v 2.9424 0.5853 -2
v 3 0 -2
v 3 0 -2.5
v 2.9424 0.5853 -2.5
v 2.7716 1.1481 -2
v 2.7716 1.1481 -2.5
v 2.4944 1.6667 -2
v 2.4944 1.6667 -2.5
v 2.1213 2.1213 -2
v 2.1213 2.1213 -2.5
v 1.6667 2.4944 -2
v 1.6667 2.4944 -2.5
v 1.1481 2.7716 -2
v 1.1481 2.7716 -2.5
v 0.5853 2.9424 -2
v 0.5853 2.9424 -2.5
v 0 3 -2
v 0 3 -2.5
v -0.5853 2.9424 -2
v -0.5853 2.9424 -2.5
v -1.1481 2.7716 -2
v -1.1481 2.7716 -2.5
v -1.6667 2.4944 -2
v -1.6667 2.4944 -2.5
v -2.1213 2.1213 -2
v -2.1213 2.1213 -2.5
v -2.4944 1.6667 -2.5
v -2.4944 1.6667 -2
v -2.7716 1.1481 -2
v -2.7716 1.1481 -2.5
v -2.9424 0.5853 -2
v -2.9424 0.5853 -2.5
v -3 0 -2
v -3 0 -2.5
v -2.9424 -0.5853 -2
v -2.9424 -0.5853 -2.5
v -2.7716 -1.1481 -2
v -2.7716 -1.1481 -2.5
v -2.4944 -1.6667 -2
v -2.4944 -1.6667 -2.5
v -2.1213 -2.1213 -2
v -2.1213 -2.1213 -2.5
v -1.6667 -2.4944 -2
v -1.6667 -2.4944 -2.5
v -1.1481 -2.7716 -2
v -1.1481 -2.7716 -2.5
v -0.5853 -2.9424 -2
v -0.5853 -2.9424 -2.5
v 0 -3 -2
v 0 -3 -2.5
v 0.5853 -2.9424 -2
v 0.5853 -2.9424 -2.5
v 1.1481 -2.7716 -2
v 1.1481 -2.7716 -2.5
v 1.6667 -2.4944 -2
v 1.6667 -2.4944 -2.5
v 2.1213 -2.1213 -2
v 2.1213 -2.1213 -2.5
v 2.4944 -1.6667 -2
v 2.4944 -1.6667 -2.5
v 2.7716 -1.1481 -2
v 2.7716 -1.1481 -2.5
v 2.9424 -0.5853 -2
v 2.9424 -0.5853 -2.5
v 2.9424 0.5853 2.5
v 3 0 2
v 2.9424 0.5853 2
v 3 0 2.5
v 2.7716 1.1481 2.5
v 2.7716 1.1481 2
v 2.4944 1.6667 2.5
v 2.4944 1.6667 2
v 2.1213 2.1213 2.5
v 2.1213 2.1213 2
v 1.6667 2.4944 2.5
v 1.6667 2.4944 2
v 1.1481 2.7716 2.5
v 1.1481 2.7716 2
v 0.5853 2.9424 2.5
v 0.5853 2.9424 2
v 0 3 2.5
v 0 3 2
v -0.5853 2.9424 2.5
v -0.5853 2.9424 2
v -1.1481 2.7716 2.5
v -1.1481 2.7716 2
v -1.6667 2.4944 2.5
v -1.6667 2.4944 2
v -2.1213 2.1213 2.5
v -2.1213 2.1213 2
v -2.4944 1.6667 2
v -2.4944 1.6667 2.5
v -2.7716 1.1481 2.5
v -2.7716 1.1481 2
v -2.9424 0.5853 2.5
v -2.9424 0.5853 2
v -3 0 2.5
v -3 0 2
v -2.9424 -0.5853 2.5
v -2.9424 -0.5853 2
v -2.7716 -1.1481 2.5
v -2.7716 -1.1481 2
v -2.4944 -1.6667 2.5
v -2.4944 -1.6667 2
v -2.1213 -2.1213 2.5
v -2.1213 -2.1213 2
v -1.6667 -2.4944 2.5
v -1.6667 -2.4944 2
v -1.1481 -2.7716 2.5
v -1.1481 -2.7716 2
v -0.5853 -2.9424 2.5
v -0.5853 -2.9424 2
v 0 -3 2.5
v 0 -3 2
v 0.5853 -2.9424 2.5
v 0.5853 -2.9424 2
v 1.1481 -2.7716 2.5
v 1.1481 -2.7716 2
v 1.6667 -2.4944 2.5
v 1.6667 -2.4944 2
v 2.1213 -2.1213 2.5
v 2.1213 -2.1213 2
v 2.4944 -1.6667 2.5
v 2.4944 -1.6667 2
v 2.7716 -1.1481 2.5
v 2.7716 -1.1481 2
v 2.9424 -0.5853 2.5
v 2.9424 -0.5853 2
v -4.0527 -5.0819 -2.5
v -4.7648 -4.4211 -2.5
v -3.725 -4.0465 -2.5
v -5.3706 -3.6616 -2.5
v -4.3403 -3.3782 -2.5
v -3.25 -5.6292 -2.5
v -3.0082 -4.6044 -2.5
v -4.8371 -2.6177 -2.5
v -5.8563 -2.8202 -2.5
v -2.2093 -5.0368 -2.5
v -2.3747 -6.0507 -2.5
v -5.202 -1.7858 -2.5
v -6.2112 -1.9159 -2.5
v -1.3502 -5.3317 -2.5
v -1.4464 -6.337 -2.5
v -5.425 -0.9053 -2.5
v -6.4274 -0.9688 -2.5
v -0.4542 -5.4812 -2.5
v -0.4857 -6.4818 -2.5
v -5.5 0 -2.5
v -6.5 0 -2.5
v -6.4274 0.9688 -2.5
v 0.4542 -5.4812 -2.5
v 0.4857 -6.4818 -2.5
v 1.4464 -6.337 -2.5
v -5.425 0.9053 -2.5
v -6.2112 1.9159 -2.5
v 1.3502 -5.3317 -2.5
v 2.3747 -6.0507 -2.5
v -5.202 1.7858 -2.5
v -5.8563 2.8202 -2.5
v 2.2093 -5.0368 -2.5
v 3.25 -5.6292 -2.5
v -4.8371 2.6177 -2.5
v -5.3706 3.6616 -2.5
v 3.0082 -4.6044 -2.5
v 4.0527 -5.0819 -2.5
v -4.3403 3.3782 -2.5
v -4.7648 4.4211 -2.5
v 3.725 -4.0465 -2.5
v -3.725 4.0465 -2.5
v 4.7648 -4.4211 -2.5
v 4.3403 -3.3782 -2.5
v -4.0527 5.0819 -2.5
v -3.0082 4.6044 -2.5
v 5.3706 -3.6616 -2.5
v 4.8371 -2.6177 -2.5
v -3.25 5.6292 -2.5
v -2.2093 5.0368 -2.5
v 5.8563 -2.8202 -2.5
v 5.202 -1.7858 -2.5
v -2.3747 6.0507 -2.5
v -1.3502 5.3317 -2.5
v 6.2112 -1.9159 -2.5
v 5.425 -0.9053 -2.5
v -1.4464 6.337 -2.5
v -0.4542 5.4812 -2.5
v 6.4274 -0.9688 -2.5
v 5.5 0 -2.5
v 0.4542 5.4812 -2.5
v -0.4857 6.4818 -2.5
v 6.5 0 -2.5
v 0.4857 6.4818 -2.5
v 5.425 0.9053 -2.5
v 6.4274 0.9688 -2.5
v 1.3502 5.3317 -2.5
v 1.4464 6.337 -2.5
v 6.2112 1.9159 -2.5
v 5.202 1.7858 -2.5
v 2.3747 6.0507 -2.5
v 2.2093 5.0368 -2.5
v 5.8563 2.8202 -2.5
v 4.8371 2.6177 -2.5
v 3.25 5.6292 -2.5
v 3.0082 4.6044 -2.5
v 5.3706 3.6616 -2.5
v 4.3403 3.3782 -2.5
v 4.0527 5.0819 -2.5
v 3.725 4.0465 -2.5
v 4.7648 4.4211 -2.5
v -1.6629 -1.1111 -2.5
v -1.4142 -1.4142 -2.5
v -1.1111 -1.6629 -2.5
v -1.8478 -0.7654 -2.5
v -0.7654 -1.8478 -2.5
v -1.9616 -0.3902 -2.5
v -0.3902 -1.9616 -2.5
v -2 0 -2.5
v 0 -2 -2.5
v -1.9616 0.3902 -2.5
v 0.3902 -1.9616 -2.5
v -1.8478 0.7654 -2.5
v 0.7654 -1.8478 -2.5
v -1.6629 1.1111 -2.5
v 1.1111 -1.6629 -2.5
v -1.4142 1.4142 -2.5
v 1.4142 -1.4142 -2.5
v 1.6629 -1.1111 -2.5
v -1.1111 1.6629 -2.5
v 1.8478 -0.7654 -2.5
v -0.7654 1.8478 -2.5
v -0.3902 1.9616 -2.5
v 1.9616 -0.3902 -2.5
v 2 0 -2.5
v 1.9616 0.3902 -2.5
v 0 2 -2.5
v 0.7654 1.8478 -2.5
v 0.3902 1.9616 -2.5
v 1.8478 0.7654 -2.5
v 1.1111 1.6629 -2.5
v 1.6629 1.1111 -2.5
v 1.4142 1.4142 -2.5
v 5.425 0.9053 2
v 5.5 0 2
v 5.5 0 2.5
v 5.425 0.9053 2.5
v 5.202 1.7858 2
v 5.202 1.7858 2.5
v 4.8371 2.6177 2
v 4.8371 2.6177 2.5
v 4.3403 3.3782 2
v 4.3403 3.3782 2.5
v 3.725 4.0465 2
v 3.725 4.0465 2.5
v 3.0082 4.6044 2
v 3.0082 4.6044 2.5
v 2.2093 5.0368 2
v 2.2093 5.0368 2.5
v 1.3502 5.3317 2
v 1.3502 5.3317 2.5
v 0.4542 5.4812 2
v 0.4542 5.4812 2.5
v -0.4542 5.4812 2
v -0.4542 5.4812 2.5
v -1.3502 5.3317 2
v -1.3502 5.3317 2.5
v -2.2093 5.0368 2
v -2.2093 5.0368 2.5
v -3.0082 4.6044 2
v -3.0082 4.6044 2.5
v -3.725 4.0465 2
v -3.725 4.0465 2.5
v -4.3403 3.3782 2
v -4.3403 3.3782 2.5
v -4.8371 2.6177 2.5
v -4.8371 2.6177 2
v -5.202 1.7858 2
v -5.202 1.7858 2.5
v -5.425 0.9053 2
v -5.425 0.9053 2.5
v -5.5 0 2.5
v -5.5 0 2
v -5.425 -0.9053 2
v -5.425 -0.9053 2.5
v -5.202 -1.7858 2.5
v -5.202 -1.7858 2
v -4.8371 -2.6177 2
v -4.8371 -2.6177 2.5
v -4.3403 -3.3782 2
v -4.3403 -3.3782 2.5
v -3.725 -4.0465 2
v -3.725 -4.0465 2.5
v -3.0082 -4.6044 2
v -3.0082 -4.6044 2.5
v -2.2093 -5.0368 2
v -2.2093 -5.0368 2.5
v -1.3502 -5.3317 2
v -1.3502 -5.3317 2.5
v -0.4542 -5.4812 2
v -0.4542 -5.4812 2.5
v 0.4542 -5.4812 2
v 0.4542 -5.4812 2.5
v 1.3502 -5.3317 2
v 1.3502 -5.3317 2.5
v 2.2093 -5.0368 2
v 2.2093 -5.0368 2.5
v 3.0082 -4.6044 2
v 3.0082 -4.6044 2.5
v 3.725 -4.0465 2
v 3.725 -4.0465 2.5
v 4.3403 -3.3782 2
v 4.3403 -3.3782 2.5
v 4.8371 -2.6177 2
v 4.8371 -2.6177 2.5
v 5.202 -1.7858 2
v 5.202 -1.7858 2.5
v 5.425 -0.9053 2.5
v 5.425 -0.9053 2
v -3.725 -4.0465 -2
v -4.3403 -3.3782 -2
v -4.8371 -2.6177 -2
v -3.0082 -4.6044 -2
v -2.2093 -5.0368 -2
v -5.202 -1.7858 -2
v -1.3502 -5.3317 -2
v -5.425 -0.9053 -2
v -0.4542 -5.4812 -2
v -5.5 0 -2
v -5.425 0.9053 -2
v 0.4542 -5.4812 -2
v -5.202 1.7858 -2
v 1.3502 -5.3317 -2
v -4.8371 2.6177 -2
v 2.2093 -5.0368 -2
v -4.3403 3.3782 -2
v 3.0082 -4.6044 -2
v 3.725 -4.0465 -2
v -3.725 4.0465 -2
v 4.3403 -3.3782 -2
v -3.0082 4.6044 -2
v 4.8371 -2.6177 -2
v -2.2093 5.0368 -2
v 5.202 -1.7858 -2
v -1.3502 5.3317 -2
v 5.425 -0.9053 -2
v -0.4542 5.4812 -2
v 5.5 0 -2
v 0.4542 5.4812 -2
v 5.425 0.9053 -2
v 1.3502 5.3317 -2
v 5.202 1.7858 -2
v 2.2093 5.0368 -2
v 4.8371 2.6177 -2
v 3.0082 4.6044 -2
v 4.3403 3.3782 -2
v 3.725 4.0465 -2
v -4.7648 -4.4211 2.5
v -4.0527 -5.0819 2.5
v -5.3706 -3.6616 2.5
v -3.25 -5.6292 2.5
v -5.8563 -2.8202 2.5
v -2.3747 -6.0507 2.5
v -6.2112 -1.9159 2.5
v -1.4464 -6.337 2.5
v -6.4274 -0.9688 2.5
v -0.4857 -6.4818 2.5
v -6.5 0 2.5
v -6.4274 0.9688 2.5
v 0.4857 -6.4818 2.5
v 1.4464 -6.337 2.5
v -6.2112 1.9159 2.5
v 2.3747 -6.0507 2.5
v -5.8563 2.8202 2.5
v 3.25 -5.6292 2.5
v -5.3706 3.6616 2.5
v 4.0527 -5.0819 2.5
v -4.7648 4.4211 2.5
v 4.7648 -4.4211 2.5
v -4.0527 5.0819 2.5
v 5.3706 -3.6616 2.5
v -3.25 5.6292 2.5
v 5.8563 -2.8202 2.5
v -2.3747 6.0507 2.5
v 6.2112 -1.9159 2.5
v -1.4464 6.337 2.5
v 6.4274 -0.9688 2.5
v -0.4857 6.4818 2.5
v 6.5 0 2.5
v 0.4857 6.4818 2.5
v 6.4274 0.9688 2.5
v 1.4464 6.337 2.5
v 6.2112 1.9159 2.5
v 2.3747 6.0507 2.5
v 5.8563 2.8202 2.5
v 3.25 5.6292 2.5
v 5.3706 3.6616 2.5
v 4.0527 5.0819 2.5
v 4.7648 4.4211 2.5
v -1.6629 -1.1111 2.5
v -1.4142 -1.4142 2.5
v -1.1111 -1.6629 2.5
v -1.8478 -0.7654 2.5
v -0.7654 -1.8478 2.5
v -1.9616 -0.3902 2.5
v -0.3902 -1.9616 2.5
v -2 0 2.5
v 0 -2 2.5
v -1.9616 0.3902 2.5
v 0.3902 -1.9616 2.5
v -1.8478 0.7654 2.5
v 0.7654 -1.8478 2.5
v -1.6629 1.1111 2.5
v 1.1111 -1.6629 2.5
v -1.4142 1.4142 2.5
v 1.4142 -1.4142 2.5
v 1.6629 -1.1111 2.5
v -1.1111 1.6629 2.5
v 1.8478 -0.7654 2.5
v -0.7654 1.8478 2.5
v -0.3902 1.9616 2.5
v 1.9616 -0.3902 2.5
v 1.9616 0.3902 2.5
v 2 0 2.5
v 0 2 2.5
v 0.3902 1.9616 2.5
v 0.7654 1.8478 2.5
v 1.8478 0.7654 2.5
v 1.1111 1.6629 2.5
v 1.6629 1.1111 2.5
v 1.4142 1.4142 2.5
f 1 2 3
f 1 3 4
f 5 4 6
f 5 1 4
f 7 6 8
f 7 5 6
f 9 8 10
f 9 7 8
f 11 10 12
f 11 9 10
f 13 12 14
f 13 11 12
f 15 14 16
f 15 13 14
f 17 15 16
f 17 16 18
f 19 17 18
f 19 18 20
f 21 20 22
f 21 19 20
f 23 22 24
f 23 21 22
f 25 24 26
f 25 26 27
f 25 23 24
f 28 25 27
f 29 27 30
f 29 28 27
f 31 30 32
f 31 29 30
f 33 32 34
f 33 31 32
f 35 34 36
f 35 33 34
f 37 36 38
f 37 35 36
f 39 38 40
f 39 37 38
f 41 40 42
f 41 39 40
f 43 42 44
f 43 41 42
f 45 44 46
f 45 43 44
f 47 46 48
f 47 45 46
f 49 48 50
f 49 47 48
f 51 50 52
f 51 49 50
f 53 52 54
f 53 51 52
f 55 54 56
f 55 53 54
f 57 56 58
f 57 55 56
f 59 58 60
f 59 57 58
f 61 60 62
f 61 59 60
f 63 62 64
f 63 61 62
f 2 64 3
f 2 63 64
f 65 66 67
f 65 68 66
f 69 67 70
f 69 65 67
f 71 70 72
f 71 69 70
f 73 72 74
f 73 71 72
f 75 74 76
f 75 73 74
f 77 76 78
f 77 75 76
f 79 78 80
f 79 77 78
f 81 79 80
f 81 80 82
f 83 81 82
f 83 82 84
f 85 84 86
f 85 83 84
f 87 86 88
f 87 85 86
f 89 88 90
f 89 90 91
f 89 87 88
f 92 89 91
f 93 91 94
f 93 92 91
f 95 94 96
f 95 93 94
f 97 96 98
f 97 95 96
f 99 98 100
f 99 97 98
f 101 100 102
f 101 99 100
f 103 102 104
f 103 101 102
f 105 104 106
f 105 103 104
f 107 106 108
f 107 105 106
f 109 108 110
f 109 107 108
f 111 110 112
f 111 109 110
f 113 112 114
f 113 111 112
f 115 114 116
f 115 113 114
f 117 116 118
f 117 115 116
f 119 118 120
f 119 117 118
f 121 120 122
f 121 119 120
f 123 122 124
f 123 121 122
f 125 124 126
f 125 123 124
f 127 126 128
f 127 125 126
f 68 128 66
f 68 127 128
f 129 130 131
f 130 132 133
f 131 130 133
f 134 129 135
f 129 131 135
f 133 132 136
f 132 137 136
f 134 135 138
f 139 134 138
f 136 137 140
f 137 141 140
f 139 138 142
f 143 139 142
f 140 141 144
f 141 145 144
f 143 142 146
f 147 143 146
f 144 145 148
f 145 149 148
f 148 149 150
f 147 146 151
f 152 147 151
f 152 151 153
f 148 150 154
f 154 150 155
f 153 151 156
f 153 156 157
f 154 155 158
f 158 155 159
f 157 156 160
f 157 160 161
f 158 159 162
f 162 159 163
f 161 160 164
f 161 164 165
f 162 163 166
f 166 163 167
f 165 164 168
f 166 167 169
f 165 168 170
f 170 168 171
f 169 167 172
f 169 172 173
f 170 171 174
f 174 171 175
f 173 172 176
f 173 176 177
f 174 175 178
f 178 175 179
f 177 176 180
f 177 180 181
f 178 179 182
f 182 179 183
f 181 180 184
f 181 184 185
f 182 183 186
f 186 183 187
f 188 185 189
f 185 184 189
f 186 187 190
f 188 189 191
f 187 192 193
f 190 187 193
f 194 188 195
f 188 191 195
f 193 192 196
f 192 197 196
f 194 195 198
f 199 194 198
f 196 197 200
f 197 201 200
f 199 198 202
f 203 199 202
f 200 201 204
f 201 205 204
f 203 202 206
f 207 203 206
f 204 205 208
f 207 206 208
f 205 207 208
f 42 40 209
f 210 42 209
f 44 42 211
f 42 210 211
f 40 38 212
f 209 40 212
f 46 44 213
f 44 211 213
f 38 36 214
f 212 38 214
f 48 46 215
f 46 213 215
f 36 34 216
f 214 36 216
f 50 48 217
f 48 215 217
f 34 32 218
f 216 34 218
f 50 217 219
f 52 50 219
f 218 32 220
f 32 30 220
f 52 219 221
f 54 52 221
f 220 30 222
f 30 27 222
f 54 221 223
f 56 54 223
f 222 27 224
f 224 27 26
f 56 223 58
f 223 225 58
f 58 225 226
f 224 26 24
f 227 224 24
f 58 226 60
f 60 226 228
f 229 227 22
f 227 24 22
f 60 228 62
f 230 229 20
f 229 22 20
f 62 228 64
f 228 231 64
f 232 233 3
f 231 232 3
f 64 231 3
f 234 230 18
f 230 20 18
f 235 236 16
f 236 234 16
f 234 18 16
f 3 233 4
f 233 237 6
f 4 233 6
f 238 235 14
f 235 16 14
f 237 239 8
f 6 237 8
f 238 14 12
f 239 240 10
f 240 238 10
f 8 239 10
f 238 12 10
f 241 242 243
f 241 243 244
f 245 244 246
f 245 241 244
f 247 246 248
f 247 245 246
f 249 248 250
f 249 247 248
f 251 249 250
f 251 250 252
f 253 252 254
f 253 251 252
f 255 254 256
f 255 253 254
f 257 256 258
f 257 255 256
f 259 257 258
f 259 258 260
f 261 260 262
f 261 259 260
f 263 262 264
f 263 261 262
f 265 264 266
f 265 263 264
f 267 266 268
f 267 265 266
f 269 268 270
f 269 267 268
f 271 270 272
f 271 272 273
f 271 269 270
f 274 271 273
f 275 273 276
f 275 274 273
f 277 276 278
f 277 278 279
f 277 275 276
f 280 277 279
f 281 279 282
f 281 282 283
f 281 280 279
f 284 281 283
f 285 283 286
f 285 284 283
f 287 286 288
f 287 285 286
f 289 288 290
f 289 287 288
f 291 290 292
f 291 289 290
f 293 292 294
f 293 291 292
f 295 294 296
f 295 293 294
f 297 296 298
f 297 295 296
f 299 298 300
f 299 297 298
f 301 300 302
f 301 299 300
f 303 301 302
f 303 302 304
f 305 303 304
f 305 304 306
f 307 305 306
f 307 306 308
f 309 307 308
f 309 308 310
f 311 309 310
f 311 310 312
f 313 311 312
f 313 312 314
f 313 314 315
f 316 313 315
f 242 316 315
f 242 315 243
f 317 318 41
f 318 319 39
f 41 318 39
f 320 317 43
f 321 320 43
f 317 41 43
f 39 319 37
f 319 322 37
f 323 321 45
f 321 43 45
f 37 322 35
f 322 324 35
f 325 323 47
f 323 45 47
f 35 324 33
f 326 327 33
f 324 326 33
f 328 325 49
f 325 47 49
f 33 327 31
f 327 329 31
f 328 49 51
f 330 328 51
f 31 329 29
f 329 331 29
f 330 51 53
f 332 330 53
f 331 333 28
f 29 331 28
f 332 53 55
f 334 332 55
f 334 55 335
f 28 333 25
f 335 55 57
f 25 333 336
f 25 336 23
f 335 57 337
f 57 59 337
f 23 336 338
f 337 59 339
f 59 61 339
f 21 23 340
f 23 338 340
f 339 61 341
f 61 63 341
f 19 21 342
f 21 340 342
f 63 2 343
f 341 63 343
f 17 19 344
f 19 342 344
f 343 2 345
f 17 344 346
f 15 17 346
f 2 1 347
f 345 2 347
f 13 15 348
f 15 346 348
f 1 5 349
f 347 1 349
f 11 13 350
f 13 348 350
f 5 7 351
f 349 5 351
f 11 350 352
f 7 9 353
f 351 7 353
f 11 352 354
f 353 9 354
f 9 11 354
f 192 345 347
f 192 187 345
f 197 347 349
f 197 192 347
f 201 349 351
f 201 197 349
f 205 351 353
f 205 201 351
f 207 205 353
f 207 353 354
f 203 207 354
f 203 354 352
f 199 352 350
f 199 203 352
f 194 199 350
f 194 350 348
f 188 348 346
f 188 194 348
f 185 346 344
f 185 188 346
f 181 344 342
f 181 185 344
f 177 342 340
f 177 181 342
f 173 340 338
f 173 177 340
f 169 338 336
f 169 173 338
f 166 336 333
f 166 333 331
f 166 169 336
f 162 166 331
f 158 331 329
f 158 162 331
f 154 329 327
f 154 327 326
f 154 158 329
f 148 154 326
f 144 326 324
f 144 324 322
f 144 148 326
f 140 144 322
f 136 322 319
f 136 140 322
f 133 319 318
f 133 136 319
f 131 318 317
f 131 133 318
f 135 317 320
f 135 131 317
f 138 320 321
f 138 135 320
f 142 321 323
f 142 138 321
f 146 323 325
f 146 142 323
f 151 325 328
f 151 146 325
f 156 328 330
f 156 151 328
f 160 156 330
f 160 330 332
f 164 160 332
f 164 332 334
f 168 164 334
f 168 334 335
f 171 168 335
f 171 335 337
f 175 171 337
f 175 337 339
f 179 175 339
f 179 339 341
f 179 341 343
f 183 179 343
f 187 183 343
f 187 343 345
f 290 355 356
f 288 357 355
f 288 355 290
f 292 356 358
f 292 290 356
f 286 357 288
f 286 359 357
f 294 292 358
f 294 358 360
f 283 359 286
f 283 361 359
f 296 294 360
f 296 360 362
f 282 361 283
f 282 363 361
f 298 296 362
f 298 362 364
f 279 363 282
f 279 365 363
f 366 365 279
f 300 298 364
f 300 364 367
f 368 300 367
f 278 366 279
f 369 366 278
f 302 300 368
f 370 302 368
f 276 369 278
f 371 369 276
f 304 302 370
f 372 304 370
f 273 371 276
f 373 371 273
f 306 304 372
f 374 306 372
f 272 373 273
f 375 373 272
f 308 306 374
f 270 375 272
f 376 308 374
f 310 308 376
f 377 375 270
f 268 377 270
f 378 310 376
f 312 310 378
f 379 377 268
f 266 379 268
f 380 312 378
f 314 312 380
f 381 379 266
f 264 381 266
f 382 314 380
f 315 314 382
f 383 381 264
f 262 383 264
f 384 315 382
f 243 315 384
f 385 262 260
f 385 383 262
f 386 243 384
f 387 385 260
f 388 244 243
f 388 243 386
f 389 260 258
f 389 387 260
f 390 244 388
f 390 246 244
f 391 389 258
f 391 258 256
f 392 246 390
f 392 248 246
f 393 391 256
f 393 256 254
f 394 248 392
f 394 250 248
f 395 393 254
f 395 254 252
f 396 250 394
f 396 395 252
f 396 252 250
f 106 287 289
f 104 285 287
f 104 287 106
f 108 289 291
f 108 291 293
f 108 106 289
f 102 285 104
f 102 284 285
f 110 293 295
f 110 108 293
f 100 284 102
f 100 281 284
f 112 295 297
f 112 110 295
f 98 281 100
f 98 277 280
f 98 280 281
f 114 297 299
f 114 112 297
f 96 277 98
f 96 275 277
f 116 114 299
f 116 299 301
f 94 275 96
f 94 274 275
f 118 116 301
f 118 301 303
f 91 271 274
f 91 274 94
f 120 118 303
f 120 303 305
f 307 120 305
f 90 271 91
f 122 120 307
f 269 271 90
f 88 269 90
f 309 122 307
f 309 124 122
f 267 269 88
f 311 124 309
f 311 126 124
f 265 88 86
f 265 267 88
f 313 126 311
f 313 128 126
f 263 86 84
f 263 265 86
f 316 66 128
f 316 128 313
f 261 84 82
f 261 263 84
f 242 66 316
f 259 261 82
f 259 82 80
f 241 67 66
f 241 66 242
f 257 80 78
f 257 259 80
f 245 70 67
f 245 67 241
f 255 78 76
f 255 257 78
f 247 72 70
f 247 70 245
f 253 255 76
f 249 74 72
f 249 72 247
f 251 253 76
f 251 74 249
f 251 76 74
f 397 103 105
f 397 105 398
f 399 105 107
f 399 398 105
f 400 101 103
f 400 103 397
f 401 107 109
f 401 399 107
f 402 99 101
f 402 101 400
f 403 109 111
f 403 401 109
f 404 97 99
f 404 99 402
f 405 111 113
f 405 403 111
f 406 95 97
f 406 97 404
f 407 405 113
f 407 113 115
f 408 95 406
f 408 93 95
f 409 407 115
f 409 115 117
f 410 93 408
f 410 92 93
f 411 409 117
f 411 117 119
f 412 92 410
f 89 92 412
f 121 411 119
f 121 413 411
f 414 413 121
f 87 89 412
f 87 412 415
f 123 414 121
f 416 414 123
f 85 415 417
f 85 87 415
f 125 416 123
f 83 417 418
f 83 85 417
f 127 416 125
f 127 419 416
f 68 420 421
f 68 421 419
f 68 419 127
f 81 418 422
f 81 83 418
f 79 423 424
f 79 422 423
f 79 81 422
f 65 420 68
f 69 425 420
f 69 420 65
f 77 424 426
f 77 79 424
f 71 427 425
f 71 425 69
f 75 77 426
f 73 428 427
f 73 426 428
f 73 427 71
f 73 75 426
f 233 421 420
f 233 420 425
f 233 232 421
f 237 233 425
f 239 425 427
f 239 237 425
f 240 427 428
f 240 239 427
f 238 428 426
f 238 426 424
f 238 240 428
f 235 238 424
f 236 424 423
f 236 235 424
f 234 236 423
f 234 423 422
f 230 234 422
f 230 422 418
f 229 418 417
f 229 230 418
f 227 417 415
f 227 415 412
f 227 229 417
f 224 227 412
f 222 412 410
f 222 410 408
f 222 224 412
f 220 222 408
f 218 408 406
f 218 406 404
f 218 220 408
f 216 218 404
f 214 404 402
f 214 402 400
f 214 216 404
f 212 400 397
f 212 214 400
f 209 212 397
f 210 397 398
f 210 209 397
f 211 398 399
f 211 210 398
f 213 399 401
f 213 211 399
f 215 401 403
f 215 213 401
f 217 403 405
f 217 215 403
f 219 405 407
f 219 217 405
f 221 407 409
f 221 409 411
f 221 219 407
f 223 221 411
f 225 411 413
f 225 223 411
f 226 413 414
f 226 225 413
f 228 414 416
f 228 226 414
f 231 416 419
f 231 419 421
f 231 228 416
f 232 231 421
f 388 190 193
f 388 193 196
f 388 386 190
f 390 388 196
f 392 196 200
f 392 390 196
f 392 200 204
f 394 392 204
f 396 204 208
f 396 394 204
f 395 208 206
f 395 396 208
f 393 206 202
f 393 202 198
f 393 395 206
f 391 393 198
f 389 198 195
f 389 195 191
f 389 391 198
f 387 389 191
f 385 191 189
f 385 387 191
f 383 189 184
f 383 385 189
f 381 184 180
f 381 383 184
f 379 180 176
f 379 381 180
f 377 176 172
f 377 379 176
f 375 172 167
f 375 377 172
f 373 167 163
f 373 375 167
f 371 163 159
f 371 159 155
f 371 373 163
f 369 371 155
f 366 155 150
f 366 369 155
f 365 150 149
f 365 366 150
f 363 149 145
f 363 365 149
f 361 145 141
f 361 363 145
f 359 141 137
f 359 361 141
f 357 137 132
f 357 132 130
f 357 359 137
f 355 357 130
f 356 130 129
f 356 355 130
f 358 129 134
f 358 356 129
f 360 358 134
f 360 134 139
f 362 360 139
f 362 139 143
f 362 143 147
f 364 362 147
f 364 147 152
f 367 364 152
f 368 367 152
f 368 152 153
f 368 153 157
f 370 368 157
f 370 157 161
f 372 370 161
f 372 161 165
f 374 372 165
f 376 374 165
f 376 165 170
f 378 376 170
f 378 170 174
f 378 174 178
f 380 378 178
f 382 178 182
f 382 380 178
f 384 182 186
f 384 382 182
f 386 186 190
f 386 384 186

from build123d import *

# Parameters (mm, degrees)
F0_R     = 6.5
F0_R_2   = 5.5
F1_DEPTH = 2.5
F0_R_3   = 3
F0_R_4   = 2
F2_DEPTH = 2


with BuildPart() as f1:
    # F0 (on Top) → F1 (new body, symmetric)
    with BuildSketch(Plane.XY):
        Circle(F0_R)
        Circle(F0_R_2, mode=Mode.SUBTRACT)
    extrude(amount=F1_DEPTH, both=True)



with BuildPart() as f1b:
    # F0 (on Top) → F1, piece 2 (new body, symmetric)
    with BuildSketch(Plane.XY):
        Circle(F0_R_3)
        Circle(F0_R_4, mode=Mode.SUBTRACT)
    extrude(amount=F1_DEPTH, both=True)


with BuildPart() as f1_1:
    add(f1.part)

    add(f1b.part)  # F2 merges F1b
    # F0 (on Top) → F2 (join, symmetric)
    with BuildSketch(Plane.XY):
        Circle(F0_R_2)
        Circle(F0_R_3, mode=Mode.SUBTRACT)
    extrude(amount=F2_DEPTH, both=True)


solid = f1_1.part
